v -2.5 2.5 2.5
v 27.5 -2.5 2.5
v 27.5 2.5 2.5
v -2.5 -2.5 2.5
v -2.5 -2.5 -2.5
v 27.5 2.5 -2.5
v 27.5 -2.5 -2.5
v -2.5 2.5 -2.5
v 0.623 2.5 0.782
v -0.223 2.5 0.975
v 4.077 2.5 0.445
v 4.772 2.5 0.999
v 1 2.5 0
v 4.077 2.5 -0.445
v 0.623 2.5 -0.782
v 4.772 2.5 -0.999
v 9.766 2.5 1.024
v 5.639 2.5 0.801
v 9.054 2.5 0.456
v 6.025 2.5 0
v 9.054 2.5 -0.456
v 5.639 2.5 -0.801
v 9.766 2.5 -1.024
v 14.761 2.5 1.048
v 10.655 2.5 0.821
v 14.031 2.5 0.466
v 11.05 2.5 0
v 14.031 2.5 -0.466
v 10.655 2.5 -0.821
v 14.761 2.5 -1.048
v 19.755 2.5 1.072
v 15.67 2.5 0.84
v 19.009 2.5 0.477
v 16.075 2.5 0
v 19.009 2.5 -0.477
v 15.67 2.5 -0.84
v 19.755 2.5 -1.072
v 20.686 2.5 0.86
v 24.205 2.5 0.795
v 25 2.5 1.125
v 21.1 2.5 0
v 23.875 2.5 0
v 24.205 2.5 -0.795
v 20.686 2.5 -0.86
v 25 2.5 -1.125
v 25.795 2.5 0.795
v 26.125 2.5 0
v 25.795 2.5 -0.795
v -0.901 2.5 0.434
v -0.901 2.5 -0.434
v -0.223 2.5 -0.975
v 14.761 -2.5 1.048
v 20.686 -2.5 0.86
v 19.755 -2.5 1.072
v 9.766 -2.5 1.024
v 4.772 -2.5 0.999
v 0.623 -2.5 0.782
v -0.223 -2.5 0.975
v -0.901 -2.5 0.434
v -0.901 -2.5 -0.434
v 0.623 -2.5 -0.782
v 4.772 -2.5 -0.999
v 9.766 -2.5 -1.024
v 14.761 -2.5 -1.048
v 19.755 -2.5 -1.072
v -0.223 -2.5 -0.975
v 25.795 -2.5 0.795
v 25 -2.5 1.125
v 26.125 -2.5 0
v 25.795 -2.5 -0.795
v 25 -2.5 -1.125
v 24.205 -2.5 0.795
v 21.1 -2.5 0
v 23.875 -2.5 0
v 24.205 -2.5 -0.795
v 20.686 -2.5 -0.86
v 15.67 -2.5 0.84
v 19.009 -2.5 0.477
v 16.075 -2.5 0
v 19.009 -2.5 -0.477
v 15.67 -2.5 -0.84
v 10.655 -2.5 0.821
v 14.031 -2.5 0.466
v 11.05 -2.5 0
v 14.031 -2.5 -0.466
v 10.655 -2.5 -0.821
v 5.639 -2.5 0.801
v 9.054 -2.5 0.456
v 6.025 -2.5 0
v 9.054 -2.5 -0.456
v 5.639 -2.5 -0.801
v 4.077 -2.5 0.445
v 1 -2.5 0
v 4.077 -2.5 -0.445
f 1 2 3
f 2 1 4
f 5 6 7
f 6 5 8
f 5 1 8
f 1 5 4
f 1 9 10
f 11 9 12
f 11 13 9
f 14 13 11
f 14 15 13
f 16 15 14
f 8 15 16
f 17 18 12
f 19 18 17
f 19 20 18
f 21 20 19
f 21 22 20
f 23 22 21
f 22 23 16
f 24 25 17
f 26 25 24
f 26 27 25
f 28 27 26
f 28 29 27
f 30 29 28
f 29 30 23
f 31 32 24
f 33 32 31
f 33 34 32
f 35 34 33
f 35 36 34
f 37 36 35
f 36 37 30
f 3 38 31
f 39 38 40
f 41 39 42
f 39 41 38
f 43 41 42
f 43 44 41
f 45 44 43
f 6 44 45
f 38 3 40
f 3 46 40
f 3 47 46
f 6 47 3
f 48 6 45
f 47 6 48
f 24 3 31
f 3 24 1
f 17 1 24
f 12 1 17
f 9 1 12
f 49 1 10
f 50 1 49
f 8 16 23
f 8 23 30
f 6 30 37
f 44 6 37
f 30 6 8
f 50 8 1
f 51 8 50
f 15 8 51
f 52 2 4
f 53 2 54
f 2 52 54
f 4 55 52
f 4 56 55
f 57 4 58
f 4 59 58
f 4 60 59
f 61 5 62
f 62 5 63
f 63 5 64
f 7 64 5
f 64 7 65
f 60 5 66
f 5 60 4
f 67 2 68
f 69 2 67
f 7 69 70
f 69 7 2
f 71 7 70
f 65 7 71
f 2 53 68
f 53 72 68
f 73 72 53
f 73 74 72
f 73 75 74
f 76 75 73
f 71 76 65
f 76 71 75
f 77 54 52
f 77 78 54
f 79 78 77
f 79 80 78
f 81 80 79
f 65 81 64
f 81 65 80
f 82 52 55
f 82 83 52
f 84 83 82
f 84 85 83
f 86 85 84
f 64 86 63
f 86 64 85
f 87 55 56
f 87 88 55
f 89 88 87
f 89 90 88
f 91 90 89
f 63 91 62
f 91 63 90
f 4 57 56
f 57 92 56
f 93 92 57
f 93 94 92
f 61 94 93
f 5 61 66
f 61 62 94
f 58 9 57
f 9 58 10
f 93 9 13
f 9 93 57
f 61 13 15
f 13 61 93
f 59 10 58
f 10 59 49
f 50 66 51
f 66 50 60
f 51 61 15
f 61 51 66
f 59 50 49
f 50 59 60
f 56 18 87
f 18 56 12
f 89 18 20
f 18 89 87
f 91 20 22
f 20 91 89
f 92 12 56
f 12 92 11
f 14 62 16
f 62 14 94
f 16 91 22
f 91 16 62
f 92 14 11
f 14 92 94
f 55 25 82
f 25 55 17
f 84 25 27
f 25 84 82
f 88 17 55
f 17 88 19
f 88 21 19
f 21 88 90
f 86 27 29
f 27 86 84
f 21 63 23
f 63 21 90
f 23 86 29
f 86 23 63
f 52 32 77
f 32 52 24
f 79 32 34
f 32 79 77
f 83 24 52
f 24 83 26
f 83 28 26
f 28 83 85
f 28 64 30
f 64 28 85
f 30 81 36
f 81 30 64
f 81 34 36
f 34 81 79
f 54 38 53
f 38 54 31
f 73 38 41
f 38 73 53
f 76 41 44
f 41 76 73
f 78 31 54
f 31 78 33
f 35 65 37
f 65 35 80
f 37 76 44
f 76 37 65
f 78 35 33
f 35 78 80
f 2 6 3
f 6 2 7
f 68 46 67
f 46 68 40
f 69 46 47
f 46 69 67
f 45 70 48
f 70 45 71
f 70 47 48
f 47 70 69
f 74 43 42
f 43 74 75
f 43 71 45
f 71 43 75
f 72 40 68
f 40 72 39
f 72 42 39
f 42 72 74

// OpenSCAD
$fa = .01;
$fs = 1;

for(i=[0:5]){
    translate([i*5,0,0]){
        difference(){
            cube(5,center=true);
            rotate([90,0,0]) cylinder(h=60, d=2+i*.05, center=true);
        }
    }
}
